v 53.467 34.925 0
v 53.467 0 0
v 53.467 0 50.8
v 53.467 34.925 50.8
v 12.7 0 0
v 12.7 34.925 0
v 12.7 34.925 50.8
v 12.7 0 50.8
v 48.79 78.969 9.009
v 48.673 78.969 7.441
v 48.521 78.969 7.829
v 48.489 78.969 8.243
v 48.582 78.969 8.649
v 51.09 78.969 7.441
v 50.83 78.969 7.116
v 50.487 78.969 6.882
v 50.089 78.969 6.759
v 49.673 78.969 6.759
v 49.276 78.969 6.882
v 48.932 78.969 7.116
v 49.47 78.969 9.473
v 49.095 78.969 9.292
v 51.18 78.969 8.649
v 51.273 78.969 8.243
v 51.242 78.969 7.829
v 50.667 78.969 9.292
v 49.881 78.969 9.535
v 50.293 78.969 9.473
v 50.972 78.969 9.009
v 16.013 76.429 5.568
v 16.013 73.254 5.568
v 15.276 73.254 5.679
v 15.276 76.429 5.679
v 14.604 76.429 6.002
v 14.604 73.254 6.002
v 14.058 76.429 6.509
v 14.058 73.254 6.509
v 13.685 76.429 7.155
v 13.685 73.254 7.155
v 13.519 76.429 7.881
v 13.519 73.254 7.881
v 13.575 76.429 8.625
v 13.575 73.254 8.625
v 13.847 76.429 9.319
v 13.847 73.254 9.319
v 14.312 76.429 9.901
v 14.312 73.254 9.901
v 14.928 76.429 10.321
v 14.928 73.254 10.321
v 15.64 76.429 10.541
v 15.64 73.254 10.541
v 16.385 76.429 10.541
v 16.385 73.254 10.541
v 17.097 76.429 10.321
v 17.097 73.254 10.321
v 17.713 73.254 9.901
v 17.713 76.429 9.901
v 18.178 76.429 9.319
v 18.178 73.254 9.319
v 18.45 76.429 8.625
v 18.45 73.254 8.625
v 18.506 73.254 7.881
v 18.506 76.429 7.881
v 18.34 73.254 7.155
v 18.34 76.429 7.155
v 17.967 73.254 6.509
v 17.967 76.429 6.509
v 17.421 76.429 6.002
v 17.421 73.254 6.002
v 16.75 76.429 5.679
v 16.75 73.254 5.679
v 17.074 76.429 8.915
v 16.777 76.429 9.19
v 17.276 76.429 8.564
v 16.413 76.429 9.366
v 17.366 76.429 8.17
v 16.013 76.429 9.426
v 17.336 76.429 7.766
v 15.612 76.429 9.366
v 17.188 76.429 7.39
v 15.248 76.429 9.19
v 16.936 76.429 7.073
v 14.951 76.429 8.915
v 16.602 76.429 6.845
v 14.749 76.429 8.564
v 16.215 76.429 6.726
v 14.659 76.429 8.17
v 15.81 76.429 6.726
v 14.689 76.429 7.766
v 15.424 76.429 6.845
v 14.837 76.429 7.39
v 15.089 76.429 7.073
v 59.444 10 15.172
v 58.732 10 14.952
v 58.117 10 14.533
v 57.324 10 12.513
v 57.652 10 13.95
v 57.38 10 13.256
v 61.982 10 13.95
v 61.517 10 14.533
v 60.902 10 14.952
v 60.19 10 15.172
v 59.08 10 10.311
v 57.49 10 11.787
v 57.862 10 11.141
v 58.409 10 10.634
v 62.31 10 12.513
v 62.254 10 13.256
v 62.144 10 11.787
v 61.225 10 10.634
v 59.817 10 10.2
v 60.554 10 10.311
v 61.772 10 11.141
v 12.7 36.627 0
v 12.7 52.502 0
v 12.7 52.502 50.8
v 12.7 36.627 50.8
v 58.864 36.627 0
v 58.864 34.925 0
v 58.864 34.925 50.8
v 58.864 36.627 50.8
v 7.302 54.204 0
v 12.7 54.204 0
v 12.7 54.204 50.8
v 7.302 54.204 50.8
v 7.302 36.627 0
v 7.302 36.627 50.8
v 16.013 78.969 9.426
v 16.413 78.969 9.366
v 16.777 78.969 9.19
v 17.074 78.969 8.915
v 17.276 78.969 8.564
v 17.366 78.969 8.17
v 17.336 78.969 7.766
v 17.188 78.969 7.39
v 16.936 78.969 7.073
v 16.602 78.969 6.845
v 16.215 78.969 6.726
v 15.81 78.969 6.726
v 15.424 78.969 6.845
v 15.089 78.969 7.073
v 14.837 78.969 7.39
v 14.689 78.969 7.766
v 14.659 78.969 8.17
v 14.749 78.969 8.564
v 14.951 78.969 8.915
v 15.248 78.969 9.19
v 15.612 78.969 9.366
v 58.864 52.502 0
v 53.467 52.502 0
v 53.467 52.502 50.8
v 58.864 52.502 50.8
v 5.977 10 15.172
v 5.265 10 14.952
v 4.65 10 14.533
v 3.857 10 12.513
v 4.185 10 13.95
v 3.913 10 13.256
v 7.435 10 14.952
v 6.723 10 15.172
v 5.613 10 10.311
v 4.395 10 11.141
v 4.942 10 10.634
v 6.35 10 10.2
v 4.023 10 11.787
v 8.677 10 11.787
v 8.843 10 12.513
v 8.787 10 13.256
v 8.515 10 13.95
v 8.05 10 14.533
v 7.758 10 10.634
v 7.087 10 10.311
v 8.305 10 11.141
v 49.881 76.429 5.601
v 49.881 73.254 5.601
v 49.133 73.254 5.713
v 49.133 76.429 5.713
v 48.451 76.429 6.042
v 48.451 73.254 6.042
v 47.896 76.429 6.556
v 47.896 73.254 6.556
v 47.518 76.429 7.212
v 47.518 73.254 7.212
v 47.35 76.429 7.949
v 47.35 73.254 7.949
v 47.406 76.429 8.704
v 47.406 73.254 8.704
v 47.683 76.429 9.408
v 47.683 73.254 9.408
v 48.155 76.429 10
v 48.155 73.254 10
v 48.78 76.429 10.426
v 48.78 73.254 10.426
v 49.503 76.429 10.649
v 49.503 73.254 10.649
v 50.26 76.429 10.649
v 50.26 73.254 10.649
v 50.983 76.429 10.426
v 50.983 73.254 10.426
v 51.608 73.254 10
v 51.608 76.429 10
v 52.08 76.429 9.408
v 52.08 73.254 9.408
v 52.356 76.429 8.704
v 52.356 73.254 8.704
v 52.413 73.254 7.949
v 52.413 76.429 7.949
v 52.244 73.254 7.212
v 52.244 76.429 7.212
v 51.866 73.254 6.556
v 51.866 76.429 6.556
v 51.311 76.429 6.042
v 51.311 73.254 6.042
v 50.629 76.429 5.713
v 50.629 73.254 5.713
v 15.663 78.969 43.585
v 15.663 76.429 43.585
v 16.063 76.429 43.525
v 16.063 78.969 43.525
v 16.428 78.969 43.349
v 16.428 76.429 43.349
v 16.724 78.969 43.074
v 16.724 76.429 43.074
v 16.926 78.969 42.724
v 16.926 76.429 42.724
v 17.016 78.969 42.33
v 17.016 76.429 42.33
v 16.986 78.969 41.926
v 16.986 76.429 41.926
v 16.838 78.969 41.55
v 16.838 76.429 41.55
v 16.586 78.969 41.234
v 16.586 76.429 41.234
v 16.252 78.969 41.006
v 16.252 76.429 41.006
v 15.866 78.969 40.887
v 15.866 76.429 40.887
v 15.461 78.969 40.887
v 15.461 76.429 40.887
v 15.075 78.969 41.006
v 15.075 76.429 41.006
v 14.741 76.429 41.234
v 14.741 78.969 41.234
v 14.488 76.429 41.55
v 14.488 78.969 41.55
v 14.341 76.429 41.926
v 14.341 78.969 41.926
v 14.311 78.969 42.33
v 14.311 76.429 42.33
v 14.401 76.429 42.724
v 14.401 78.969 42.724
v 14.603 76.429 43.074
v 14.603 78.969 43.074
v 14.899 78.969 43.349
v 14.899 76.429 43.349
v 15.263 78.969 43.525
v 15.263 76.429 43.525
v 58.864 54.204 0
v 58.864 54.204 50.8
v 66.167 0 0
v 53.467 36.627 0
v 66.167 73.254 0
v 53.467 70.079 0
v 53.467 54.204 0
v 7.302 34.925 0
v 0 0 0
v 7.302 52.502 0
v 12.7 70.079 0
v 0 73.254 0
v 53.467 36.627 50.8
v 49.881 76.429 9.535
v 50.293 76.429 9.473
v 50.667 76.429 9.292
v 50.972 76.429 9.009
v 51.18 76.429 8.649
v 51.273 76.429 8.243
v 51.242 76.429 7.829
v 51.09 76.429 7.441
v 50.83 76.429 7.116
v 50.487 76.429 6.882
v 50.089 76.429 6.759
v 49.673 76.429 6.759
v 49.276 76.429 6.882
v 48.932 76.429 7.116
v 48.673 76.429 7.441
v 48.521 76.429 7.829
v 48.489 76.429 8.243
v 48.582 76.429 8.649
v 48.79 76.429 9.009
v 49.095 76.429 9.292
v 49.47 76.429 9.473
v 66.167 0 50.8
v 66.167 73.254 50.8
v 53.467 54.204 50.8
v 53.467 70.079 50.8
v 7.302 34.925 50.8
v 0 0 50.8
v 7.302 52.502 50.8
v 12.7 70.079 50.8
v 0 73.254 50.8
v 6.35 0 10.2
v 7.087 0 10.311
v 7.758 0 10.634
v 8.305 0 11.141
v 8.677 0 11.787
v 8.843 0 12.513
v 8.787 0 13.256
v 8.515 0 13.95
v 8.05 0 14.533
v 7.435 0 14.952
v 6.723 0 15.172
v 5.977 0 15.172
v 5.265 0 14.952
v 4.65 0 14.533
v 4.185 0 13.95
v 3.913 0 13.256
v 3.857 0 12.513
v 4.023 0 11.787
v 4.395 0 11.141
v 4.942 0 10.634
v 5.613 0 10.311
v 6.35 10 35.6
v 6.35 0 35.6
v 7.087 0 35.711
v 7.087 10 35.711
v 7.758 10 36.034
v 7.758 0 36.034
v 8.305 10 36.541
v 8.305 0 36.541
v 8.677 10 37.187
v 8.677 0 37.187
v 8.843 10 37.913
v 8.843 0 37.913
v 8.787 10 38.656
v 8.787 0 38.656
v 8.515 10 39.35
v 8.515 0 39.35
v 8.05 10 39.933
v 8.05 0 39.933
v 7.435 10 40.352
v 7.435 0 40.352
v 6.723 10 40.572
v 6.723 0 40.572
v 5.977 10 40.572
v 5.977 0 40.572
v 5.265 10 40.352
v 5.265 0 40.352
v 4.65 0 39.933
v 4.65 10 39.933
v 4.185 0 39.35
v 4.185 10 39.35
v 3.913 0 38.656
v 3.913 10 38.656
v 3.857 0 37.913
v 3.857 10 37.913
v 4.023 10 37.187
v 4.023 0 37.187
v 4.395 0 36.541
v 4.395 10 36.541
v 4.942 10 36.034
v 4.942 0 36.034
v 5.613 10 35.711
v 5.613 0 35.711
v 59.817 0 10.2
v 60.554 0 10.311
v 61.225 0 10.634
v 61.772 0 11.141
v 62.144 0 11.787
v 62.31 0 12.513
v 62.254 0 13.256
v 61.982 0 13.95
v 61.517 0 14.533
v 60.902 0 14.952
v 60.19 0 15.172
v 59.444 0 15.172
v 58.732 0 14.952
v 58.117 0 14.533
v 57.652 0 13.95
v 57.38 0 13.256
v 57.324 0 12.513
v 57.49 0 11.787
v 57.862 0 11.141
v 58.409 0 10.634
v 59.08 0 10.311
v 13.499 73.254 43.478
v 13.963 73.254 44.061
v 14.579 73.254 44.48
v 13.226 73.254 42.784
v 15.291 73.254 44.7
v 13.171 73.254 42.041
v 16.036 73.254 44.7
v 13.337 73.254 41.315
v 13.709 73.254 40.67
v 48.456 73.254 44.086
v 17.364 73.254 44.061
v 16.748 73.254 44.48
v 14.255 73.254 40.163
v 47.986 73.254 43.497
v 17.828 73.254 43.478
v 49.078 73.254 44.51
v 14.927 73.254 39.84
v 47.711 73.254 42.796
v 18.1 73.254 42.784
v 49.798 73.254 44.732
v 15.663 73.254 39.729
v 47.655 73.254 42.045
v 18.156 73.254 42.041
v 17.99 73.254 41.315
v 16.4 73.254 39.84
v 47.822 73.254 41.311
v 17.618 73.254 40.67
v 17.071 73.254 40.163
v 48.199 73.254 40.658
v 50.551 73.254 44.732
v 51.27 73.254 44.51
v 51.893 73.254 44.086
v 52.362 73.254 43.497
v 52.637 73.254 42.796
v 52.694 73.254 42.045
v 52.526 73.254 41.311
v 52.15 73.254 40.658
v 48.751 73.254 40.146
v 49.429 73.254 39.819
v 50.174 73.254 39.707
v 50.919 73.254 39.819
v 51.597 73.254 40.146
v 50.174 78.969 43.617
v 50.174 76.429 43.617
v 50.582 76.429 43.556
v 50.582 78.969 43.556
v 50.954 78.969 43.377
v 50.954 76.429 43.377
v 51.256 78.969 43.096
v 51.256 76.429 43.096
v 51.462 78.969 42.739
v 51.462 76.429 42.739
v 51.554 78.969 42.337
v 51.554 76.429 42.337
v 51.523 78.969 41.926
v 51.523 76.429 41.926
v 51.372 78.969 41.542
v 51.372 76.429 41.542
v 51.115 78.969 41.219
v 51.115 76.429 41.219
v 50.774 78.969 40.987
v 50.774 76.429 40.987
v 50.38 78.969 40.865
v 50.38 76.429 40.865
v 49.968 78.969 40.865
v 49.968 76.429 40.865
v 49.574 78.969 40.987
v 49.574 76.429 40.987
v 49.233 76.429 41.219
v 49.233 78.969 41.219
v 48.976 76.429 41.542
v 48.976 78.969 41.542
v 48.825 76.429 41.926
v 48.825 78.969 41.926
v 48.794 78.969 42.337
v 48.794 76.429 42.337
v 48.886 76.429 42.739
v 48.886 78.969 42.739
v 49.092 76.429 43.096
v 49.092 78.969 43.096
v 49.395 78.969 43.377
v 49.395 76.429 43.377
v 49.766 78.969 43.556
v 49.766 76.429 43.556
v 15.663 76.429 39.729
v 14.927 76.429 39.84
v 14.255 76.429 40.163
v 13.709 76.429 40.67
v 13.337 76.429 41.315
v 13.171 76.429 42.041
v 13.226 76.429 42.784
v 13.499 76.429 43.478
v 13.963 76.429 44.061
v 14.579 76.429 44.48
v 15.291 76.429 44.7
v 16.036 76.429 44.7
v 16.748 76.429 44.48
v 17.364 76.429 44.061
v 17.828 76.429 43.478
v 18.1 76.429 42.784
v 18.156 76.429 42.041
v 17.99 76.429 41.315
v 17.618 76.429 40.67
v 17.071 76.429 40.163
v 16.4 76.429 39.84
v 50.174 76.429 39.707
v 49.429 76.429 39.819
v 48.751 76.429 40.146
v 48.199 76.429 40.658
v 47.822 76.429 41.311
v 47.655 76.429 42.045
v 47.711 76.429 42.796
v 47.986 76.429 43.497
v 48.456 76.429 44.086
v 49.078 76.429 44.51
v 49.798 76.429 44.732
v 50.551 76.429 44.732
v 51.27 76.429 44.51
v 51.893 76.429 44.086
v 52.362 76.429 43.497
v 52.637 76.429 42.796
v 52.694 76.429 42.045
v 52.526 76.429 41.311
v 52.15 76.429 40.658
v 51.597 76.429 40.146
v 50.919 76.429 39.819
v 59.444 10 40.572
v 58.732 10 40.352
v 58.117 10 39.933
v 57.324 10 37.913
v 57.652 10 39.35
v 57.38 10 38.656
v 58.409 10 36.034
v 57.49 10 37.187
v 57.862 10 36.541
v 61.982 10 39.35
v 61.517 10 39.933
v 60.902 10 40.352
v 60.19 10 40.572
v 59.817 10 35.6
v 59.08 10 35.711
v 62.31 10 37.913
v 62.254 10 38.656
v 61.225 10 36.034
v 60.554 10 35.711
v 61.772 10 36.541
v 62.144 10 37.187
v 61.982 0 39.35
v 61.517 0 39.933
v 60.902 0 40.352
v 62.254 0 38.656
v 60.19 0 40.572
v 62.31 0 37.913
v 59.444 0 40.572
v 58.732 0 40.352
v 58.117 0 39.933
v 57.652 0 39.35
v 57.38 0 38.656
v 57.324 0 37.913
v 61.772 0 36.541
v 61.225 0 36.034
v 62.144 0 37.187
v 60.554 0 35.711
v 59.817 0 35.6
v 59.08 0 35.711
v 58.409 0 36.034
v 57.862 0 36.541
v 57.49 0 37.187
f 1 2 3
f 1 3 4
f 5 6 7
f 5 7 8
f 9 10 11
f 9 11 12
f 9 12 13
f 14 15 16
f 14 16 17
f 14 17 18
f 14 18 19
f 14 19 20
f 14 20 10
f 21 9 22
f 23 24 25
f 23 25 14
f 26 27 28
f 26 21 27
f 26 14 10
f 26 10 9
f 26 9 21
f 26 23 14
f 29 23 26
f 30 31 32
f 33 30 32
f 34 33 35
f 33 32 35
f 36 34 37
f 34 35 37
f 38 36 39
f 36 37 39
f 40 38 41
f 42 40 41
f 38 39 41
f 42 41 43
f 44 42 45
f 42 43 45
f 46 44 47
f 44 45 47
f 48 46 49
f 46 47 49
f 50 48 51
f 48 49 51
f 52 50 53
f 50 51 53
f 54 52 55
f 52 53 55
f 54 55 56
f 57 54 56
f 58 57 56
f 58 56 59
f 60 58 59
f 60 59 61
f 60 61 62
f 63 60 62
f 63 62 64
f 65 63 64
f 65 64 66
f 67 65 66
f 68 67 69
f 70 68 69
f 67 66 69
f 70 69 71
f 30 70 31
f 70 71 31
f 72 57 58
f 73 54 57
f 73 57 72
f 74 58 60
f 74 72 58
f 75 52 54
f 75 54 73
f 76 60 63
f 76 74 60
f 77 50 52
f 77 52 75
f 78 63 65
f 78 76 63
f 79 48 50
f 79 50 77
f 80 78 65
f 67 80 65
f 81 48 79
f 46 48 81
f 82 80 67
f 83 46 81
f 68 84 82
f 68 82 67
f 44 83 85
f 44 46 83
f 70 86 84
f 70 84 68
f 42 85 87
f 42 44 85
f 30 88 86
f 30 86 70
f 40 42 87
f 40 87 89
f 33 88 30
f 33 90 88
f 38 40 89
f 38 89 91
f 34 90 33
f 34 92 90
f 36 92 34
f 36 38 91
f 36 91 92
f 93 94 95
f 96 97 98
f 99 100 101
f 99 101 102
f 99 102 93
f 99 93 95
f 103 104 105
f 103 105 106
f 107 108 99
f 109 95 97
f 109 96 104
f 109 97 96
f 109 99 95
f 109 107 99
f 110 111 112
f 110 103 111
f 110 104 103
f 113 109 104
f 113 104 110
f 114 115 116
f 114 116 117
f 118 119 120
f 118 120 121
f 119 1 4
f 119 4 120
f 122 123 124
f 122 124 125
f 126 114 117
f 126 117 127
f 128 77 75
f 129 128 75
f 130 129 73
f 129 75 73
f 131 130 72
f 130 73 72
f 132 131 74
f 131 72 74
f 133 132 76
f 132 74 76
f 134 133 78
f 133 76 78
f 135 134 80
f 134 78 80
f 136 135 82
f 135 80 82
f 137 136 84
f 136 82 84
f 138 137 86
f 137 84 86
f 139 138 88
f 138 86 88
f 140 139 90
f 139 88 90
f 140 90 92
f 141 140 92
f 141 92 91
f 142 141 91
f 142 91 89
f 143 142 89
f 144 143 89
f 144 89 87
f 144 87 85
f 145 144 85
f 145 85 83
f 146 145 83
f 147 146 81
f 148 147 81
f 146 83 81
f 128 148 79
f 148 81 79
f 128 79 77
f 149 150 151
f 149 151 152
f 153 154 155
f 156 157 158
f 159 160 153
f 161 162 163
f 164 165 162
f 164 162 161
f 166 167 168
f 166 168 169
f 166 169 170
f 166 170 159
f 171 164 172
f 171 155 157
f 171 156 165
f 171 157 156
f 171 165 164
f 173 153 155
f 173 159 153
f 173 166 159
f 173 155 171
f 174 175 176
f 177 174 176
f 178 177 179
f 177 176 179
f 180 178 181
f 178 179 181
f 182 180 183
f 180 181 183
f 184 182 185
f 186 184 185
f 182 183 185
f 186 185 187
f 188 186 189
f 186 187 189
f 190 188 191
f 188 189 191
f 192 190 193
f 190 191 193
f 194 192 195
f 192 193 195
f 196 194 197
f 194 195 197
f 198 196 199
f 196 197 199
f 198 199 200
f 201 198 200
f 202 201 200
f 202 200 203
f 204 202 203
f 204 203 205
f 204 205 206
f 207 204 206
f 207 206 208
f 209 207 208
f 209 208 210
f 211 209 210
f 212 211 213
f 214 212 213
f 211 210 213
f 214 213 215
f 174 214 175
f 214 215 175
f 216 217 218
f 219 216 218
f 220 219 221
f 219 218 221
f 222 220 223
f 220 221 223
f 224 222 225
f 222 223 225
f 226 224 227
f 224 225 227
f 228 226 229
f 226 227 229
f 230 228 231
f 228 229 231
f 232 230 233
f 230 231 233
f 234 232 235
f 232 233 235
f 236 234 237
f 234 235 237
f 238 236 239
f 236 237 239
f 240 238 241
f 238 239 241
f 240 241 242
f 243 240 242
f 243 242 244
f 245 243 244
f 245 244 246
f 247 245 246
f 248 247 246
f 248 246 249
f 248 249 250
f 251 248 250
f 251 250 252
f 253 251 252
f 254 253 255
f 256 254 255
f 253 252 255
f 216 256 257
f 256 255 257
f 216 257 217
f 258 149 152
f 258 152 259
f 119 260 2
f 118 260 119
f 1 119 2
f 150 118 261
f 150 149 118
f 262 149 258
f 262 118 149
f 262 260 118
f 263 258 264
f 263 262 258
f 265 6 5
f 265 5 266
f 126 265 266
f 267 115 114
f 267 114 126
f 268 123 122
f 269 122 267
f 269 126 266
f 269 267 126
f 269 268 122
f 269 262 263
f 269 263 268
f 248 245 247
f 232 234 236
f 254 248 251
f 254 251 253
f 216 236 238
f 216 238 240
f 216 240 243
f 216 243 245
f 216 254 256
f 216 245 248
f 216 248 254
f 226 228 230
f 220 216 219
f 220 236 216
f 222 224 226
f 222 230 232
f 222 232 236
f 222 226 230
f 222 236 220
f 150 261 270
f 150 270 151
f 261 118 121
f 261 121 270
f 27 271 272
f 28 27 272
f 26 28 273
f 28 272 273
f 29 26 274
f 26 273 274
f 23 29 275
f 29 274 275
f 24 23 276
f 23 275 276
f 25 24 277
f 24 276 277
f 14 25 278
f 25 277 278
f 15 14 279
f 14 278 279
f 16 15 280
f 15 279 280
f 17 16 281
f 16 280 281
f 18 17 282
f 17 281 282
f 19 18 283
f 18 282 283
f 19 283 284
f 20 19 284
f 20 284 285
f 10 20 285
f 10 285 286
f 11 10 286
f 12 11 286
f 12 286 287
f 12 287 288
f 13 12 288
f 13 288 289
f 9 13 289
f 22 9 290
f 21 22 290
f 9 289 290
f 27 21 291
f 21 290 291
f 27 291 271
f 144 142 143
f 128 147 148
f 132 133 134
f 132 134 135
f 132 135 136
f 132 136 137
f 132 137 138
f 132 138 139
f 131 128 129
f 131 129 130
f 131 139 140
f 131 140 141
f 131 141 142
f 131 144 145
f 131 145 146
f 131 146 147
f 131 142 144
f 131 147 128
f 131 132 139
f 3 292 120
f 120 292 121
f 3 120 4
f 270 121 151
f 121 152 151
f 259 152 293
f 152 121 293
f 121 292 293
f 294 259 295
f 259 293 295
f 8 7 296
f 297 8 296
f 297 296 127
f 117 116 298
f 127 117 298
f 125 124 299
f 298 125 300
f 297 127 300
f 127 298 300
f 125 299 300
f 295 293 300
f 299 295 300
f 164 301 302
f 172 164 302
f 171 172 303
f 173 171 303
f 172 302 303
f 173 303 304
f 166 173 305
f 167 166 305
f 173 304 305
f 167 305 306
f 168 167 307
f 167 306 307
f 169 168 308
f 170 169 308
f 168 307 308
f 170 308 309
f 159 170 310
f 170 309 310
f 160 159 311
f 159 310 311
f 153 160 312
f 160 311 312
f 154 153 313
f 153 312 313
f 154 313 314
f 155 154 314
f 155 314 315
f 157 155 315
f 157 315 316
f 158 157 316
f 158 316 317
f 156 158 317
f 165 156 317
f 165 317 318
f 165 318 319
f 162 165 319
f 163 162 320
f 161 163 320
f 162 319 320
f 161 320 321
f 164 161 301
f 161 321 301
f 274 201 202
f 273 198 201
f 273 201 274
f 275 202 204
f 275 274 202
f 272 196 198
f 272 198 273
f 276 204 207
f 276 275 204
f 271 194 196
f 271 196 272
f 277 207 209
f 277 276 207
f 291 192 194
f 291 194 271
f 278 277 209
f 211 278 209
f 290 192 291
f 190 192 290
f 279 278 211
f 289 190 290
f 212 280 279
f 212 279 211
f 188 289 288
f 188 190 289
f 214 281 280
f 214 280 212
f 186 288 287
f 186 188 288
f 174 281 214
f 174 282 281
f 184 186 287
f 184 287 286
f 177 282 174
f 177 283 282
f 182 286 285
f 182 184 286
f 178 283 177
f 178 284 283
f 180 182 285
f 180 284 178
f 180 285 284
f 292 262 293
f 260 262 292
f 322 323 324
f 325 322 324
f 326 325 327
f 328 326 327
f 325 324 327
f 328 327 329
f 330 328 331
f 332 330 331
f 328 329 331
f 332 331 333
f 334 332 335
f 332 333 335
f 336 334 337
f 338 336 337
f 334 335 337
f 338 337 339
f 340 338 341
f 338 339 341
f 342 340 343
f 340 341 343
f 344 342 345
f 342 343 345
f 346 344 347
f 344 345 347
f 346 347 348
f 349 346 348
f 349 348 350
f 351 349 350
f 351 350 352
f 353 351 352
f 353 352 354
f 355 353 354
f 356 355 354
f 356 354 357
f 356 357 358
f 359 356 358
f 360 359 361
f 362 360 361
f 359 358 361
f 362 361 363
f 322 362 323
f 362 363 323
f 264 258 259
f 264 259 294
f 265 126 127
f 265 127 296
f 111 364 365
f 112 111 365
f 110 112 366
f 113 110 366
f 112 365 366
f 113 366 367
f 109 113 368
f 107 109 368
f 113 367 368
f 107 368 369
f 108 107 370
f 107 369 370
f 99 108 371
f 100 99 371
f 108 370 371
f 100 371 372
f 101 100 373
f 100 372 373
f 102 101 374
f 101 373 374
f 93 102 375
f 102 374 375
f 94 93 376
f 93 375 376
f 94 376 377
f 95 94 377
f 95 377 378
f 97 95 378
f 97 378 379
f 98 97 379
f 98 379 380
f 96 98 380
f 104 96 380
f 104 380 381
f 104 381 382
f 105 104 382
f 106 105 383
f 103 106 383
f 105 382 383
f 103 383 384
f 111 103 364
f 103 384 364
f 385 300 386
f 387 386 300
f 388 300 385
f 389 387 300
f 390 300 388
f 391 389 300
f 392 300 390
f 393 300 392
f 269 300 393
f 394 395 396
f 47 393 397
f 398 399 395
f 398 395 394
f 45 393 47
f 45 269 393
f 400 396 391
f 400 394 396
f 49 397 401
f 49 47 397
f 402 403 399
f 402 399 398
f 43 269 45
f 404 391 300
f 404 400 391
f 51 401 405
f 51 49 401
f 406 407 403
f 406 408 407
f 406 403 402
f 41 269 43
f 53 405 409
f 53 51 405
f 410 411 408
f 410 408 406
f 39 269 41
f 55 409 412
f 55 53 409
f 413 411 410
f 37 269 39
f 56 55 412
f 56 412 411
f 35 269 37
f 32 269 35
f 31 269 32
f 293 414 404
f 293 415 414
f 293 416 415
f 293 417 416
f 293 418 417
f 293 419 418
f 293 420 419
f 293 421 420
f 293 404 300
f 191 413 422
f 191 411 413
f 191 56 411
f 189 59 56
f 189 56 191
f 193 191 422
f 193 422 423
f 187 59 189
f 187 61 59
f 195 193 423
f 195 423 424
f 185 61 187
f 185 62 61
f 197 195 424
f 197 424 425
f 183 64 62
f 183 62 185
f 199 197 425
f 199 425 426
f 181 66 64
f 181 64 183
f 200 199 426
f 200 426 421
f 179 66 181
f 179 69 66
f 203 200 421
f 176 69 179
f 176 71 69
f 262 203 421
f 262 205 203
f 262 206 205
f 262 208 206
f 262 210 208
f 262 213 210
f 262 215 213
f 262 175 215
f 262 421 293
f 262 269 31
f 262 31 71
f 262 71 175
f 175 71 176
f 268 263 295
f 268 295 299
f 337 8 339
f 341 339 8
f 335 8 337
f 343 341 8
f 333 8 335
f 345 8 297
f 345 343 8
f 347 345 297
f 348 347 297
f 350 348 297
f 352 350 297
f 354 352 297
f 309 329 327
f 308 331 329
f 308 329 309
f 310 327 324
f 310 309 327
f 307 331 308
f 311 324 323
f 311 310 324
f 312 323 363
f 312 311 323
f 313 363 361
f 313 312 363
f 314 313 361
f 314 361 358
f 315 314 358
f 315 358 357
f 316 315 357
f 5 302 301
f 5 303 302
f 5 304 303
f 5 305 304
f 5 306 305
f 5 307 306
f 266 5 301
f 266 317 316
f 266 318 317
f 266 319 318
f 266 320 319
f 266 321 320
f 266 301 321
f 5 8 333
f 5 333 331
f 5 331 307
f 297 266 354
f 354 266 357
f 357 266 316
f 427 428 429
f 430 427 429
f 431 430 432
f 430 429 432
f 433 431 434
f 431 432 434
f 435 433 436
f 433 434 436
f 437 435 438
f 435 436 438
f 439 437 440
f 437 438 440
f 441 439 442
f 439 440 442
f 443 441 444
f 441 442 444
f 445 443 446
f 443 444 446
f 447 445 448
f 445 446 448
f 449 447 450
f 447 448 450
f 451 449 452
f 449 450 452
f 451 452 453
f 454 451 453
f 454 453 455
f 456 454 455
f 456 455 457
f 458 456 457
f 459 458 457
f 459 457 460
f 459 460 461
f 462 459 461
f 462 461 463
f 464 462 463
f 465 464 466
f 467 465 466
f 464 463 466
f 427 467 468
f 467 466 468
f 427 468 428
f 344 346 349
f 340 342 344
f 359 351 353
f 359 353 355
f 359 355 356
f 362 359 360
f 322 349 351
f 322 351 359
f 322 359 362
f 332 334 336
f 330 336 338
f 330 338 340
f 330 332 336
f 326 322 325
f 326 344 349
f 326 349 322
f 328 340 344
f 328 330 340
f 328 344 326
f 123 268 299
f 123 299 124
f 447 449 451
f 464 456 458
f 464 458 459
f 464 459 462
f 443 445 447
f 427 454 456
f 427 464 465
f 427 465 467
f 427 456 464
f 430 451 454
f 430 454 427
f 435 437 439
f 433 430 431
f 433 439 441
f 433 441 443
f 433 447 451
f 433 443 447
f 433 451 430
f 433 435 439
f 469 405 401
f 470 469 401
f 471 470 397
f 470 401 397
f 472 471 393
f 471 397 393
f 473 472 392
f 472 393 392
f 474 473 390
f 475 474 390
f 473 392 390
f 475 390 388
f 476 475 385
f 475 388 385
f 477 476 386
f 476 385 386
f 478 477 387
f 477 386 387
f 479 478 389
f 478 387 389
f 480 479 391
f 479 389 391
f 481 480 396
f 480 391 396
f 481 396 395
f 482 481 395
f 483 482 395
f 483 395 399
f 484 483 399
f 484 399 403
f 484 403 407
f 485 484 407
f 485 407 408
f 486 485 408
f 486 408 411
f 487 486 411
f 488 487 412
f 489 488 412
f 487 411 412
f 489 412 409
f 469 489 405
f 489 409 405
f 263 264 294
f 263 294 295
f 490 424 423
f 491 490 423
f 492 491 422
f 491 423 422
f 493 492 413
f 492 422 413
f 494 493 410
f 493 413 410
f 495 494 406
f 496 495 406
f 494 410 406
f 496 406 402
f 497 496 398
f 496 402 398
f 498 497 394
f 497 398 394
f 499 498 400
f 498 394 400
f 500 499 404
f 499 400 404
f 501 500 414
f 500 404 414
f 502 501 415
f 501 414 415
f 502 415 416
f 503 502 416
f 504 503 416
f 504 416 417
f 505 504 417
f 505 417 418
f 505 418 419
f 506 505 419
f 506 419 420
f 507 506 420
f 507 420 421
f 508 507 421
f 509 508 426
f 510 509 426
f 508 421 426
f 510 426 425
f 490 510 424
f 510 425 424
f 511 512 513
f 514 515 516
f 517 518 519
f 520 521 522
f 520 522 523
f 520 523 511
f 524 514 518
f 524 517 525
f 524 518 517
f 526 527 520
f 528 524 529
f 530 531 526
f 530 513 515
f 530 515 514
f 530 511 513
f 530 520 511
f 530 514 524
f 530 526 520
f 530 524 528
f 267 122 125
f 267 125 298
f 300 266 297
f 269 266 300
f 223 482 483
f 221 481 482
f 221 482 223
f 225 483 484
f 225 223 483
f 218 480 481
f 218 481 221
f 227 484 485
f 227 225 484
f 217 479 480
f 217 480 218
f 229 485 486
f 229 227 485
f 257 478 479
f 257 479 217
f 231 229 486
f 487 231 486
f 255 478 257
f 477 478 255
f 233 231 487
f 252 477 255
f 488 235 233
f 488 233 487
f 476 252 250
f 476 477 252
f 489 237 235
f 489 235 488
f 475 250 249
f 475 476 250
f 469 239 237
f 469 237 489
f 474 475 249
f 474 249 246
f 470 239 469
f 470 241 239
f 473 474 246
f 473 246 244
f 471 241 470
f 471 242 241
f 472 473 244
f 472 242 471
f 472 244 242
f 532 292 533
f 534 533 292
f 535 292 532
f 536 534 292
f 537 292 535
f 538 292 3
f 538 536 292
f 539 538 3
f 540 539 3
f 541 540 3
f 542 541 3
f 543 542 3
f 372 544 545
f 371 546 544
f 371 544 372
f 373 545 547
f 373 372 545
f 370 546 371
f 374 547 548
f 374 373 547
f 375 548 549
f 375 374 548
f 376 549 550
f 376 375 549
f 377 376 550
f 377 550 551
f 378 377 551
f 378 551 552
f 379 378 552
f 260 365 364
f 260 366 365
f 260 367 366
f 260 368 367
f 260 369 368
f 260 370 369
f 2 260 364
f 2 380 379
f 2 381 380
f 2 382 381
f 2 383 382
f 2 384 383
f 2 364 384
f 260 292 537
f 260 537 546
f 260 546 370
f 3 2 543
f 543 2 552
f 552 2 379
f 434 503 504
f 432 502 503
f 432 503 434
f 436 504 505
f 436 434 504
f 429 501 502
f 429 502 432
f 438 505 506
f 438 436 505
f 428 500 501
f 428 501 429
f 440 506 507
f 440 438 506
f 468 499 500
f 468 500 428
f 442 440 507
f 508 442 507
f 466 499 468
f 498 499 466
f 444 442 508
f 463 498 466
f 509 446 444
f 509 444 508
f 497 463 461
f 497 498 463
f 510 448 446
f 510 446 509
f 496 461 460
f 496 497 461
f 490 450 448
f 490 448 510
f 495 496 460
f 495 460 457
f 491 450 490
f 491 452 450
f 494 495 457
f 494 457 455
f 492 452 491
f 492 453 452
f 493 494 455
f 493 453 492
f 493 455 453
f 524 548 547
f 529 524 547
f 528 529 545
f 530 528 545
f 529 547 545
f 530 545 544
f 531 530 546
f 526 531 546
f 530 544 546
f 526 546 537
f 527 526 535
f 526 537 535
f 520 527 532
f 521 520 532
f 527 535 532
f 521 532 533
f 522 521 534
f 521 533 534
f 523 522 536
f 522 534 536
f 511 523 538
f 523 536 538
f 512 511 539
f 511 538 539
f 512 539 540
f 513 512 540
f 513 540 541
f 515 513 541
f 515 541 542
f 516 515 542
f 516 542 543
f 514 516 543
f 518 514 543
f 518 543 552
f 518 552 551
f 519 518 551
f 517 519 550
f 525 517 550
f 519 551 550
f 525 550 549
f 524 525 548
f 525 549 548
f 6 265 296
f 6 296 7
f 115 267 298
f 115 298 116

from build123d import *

# Parameters (mm, degrees)
BOSS_EXTRUDE1_DEPTH = 50.8
SKETCH3_R           = 2.500488375
SKETCH3_R_2         = 1.357488375
SKETCH3_R_3         = 2.499609862
SKETCH3_R_4         = 2.52658695
SKETCH3_R_5         = 2.538600877
BOSS_EXTRUDE2_DEPTH = 3.175
BOSS_EXTRUDE3_START = 3.175
SKETCH3_3_R         = 1.357488375
SKETCH3_3_R_2       = 1.356609862
SKETCH3_3_R_3       = 1.38358695
SKETCH3_3_R_4       = 1.395600877
BOSS_EXTRUDE3_DEPTH = 2.54
SKETCH4_R           = 2.5
CUT_EXTRUDE1_DEPTH  = 10


with BuildPart() as part:
    # Sketch1 → Boss-Extrude1 (new body)
    with BuildSketch(Plane.XY):
        Polygon((12.7, 70.0786), (12.7, 54.2036), (7.3025, 54.2036), (7.3025, 52.5018), (12.7, 52.5018), (12.7, 36.6268), (7.3025, 36.6268), (7.3025, 34.925), (12.7, 34.925), (12.7, 0), (0, 0), (0, 73.2536), (66.167, 73.2536), (66.167, 0), (53.467, 0), (53.467, 34.925), (58.8645, 34.925), (58.8645, 36.6268), (53.467, 36.6268), (53.467, 52.5018), (58.8645, 52.5018), (58.8645, 54.2036), (53.467, 54.2036), (53.467, 70.0786), align=None)
    extrude(amount=BOSS_EXTRUDE1_DEPTH)

    # Sketch3 → Boss-Extrude2 (add)
    with BuildSketch(Plane(origin=(0, 73.2536, 0), x_dir=(1, 0, 0), z_dir=(0, 1, 0))):
        with Locations(Location((16.012534946, -8.068344252, 0), (0, 0, 90))):
            Circle(SKETCH3_R)
        with Locations((16.012534946, -8.068344252)):
            Circle(SKETCH3_R_2, mode=Mode.SUBTRACT)
        with Locations((16.012534946, -8.068344252)):
            Circle(SKETCH3_R_2)
        with Locations(Location((15.66334422, -42.22825299, 0), (0, 0, 90))):
            Circle(SKETCH3_R_3)
        with Locations(Location((50.174167917, -42.233596828, 0), (0, 0, 90))):
            Circle(SKETCH3_R_4)
        with Locations(Location((49.881189528, -8.139195897, 0), (0, 0, 90))):
            Circle(SKETCH3_R_5)
    extrude(amount=BOSS_EXTRUDE2_DEPTH)

    # Sketch3<3> → Boss-Extrude3 (add)
    with BuildSketch(Plane(origin=(0, 73.2536, 0), x_dir=(1, 0, 0), z_dir=(0, 1, 0)).offset(BOSS_EXTRUDE3_START)):
        with Locations(Location((16.012534946, -8.068344252, 0), (0, 0, 270))):
            Circle(SKETCH3_3_R)
        with Locations(Location((15.66334422, -42.22825299, 0), (0, 0, 270))):
            Circle(SKETCH3_3_R_2)
        with Locations(Location((50.174167917, -42.233596828, 0), (0, 0, 270))):
            Circle(SKETCH3_3_R_3)
        with Locations(Location((49.881189528, -8.139195897, 0), (0, 0, 270))):
            Circle(SKETCH3_3_R_4)
    extrude(amount=BOSS_EXTRUDE3_DEPTH)

    # Sketch4 → Cut-Extrude1 (cut)
    with BuildSketch(Plane.XZ):
        with Locations(Location((6.35, 38.1, 0), (0, 0, 270))):
            Circle(SKETCH4_R)
        with Locations(Location((6.35, 12.7, 0), (0, 0, 270))):
            Circle(SKETCH4_R)
        with Locations(Location((59.817, 38.1, 0), (0, 0, 270))):
            Circle(SKETCH4_R)
        with Locations(Location((59.817, 12.7, 0), (0, 0, 270))):
            Circle(SKETCH4_R)
    extrude(amount=-CUT_EXTRUDE1_DEPTH, mode=Mode.SUBTRACT)


solid = part.part
